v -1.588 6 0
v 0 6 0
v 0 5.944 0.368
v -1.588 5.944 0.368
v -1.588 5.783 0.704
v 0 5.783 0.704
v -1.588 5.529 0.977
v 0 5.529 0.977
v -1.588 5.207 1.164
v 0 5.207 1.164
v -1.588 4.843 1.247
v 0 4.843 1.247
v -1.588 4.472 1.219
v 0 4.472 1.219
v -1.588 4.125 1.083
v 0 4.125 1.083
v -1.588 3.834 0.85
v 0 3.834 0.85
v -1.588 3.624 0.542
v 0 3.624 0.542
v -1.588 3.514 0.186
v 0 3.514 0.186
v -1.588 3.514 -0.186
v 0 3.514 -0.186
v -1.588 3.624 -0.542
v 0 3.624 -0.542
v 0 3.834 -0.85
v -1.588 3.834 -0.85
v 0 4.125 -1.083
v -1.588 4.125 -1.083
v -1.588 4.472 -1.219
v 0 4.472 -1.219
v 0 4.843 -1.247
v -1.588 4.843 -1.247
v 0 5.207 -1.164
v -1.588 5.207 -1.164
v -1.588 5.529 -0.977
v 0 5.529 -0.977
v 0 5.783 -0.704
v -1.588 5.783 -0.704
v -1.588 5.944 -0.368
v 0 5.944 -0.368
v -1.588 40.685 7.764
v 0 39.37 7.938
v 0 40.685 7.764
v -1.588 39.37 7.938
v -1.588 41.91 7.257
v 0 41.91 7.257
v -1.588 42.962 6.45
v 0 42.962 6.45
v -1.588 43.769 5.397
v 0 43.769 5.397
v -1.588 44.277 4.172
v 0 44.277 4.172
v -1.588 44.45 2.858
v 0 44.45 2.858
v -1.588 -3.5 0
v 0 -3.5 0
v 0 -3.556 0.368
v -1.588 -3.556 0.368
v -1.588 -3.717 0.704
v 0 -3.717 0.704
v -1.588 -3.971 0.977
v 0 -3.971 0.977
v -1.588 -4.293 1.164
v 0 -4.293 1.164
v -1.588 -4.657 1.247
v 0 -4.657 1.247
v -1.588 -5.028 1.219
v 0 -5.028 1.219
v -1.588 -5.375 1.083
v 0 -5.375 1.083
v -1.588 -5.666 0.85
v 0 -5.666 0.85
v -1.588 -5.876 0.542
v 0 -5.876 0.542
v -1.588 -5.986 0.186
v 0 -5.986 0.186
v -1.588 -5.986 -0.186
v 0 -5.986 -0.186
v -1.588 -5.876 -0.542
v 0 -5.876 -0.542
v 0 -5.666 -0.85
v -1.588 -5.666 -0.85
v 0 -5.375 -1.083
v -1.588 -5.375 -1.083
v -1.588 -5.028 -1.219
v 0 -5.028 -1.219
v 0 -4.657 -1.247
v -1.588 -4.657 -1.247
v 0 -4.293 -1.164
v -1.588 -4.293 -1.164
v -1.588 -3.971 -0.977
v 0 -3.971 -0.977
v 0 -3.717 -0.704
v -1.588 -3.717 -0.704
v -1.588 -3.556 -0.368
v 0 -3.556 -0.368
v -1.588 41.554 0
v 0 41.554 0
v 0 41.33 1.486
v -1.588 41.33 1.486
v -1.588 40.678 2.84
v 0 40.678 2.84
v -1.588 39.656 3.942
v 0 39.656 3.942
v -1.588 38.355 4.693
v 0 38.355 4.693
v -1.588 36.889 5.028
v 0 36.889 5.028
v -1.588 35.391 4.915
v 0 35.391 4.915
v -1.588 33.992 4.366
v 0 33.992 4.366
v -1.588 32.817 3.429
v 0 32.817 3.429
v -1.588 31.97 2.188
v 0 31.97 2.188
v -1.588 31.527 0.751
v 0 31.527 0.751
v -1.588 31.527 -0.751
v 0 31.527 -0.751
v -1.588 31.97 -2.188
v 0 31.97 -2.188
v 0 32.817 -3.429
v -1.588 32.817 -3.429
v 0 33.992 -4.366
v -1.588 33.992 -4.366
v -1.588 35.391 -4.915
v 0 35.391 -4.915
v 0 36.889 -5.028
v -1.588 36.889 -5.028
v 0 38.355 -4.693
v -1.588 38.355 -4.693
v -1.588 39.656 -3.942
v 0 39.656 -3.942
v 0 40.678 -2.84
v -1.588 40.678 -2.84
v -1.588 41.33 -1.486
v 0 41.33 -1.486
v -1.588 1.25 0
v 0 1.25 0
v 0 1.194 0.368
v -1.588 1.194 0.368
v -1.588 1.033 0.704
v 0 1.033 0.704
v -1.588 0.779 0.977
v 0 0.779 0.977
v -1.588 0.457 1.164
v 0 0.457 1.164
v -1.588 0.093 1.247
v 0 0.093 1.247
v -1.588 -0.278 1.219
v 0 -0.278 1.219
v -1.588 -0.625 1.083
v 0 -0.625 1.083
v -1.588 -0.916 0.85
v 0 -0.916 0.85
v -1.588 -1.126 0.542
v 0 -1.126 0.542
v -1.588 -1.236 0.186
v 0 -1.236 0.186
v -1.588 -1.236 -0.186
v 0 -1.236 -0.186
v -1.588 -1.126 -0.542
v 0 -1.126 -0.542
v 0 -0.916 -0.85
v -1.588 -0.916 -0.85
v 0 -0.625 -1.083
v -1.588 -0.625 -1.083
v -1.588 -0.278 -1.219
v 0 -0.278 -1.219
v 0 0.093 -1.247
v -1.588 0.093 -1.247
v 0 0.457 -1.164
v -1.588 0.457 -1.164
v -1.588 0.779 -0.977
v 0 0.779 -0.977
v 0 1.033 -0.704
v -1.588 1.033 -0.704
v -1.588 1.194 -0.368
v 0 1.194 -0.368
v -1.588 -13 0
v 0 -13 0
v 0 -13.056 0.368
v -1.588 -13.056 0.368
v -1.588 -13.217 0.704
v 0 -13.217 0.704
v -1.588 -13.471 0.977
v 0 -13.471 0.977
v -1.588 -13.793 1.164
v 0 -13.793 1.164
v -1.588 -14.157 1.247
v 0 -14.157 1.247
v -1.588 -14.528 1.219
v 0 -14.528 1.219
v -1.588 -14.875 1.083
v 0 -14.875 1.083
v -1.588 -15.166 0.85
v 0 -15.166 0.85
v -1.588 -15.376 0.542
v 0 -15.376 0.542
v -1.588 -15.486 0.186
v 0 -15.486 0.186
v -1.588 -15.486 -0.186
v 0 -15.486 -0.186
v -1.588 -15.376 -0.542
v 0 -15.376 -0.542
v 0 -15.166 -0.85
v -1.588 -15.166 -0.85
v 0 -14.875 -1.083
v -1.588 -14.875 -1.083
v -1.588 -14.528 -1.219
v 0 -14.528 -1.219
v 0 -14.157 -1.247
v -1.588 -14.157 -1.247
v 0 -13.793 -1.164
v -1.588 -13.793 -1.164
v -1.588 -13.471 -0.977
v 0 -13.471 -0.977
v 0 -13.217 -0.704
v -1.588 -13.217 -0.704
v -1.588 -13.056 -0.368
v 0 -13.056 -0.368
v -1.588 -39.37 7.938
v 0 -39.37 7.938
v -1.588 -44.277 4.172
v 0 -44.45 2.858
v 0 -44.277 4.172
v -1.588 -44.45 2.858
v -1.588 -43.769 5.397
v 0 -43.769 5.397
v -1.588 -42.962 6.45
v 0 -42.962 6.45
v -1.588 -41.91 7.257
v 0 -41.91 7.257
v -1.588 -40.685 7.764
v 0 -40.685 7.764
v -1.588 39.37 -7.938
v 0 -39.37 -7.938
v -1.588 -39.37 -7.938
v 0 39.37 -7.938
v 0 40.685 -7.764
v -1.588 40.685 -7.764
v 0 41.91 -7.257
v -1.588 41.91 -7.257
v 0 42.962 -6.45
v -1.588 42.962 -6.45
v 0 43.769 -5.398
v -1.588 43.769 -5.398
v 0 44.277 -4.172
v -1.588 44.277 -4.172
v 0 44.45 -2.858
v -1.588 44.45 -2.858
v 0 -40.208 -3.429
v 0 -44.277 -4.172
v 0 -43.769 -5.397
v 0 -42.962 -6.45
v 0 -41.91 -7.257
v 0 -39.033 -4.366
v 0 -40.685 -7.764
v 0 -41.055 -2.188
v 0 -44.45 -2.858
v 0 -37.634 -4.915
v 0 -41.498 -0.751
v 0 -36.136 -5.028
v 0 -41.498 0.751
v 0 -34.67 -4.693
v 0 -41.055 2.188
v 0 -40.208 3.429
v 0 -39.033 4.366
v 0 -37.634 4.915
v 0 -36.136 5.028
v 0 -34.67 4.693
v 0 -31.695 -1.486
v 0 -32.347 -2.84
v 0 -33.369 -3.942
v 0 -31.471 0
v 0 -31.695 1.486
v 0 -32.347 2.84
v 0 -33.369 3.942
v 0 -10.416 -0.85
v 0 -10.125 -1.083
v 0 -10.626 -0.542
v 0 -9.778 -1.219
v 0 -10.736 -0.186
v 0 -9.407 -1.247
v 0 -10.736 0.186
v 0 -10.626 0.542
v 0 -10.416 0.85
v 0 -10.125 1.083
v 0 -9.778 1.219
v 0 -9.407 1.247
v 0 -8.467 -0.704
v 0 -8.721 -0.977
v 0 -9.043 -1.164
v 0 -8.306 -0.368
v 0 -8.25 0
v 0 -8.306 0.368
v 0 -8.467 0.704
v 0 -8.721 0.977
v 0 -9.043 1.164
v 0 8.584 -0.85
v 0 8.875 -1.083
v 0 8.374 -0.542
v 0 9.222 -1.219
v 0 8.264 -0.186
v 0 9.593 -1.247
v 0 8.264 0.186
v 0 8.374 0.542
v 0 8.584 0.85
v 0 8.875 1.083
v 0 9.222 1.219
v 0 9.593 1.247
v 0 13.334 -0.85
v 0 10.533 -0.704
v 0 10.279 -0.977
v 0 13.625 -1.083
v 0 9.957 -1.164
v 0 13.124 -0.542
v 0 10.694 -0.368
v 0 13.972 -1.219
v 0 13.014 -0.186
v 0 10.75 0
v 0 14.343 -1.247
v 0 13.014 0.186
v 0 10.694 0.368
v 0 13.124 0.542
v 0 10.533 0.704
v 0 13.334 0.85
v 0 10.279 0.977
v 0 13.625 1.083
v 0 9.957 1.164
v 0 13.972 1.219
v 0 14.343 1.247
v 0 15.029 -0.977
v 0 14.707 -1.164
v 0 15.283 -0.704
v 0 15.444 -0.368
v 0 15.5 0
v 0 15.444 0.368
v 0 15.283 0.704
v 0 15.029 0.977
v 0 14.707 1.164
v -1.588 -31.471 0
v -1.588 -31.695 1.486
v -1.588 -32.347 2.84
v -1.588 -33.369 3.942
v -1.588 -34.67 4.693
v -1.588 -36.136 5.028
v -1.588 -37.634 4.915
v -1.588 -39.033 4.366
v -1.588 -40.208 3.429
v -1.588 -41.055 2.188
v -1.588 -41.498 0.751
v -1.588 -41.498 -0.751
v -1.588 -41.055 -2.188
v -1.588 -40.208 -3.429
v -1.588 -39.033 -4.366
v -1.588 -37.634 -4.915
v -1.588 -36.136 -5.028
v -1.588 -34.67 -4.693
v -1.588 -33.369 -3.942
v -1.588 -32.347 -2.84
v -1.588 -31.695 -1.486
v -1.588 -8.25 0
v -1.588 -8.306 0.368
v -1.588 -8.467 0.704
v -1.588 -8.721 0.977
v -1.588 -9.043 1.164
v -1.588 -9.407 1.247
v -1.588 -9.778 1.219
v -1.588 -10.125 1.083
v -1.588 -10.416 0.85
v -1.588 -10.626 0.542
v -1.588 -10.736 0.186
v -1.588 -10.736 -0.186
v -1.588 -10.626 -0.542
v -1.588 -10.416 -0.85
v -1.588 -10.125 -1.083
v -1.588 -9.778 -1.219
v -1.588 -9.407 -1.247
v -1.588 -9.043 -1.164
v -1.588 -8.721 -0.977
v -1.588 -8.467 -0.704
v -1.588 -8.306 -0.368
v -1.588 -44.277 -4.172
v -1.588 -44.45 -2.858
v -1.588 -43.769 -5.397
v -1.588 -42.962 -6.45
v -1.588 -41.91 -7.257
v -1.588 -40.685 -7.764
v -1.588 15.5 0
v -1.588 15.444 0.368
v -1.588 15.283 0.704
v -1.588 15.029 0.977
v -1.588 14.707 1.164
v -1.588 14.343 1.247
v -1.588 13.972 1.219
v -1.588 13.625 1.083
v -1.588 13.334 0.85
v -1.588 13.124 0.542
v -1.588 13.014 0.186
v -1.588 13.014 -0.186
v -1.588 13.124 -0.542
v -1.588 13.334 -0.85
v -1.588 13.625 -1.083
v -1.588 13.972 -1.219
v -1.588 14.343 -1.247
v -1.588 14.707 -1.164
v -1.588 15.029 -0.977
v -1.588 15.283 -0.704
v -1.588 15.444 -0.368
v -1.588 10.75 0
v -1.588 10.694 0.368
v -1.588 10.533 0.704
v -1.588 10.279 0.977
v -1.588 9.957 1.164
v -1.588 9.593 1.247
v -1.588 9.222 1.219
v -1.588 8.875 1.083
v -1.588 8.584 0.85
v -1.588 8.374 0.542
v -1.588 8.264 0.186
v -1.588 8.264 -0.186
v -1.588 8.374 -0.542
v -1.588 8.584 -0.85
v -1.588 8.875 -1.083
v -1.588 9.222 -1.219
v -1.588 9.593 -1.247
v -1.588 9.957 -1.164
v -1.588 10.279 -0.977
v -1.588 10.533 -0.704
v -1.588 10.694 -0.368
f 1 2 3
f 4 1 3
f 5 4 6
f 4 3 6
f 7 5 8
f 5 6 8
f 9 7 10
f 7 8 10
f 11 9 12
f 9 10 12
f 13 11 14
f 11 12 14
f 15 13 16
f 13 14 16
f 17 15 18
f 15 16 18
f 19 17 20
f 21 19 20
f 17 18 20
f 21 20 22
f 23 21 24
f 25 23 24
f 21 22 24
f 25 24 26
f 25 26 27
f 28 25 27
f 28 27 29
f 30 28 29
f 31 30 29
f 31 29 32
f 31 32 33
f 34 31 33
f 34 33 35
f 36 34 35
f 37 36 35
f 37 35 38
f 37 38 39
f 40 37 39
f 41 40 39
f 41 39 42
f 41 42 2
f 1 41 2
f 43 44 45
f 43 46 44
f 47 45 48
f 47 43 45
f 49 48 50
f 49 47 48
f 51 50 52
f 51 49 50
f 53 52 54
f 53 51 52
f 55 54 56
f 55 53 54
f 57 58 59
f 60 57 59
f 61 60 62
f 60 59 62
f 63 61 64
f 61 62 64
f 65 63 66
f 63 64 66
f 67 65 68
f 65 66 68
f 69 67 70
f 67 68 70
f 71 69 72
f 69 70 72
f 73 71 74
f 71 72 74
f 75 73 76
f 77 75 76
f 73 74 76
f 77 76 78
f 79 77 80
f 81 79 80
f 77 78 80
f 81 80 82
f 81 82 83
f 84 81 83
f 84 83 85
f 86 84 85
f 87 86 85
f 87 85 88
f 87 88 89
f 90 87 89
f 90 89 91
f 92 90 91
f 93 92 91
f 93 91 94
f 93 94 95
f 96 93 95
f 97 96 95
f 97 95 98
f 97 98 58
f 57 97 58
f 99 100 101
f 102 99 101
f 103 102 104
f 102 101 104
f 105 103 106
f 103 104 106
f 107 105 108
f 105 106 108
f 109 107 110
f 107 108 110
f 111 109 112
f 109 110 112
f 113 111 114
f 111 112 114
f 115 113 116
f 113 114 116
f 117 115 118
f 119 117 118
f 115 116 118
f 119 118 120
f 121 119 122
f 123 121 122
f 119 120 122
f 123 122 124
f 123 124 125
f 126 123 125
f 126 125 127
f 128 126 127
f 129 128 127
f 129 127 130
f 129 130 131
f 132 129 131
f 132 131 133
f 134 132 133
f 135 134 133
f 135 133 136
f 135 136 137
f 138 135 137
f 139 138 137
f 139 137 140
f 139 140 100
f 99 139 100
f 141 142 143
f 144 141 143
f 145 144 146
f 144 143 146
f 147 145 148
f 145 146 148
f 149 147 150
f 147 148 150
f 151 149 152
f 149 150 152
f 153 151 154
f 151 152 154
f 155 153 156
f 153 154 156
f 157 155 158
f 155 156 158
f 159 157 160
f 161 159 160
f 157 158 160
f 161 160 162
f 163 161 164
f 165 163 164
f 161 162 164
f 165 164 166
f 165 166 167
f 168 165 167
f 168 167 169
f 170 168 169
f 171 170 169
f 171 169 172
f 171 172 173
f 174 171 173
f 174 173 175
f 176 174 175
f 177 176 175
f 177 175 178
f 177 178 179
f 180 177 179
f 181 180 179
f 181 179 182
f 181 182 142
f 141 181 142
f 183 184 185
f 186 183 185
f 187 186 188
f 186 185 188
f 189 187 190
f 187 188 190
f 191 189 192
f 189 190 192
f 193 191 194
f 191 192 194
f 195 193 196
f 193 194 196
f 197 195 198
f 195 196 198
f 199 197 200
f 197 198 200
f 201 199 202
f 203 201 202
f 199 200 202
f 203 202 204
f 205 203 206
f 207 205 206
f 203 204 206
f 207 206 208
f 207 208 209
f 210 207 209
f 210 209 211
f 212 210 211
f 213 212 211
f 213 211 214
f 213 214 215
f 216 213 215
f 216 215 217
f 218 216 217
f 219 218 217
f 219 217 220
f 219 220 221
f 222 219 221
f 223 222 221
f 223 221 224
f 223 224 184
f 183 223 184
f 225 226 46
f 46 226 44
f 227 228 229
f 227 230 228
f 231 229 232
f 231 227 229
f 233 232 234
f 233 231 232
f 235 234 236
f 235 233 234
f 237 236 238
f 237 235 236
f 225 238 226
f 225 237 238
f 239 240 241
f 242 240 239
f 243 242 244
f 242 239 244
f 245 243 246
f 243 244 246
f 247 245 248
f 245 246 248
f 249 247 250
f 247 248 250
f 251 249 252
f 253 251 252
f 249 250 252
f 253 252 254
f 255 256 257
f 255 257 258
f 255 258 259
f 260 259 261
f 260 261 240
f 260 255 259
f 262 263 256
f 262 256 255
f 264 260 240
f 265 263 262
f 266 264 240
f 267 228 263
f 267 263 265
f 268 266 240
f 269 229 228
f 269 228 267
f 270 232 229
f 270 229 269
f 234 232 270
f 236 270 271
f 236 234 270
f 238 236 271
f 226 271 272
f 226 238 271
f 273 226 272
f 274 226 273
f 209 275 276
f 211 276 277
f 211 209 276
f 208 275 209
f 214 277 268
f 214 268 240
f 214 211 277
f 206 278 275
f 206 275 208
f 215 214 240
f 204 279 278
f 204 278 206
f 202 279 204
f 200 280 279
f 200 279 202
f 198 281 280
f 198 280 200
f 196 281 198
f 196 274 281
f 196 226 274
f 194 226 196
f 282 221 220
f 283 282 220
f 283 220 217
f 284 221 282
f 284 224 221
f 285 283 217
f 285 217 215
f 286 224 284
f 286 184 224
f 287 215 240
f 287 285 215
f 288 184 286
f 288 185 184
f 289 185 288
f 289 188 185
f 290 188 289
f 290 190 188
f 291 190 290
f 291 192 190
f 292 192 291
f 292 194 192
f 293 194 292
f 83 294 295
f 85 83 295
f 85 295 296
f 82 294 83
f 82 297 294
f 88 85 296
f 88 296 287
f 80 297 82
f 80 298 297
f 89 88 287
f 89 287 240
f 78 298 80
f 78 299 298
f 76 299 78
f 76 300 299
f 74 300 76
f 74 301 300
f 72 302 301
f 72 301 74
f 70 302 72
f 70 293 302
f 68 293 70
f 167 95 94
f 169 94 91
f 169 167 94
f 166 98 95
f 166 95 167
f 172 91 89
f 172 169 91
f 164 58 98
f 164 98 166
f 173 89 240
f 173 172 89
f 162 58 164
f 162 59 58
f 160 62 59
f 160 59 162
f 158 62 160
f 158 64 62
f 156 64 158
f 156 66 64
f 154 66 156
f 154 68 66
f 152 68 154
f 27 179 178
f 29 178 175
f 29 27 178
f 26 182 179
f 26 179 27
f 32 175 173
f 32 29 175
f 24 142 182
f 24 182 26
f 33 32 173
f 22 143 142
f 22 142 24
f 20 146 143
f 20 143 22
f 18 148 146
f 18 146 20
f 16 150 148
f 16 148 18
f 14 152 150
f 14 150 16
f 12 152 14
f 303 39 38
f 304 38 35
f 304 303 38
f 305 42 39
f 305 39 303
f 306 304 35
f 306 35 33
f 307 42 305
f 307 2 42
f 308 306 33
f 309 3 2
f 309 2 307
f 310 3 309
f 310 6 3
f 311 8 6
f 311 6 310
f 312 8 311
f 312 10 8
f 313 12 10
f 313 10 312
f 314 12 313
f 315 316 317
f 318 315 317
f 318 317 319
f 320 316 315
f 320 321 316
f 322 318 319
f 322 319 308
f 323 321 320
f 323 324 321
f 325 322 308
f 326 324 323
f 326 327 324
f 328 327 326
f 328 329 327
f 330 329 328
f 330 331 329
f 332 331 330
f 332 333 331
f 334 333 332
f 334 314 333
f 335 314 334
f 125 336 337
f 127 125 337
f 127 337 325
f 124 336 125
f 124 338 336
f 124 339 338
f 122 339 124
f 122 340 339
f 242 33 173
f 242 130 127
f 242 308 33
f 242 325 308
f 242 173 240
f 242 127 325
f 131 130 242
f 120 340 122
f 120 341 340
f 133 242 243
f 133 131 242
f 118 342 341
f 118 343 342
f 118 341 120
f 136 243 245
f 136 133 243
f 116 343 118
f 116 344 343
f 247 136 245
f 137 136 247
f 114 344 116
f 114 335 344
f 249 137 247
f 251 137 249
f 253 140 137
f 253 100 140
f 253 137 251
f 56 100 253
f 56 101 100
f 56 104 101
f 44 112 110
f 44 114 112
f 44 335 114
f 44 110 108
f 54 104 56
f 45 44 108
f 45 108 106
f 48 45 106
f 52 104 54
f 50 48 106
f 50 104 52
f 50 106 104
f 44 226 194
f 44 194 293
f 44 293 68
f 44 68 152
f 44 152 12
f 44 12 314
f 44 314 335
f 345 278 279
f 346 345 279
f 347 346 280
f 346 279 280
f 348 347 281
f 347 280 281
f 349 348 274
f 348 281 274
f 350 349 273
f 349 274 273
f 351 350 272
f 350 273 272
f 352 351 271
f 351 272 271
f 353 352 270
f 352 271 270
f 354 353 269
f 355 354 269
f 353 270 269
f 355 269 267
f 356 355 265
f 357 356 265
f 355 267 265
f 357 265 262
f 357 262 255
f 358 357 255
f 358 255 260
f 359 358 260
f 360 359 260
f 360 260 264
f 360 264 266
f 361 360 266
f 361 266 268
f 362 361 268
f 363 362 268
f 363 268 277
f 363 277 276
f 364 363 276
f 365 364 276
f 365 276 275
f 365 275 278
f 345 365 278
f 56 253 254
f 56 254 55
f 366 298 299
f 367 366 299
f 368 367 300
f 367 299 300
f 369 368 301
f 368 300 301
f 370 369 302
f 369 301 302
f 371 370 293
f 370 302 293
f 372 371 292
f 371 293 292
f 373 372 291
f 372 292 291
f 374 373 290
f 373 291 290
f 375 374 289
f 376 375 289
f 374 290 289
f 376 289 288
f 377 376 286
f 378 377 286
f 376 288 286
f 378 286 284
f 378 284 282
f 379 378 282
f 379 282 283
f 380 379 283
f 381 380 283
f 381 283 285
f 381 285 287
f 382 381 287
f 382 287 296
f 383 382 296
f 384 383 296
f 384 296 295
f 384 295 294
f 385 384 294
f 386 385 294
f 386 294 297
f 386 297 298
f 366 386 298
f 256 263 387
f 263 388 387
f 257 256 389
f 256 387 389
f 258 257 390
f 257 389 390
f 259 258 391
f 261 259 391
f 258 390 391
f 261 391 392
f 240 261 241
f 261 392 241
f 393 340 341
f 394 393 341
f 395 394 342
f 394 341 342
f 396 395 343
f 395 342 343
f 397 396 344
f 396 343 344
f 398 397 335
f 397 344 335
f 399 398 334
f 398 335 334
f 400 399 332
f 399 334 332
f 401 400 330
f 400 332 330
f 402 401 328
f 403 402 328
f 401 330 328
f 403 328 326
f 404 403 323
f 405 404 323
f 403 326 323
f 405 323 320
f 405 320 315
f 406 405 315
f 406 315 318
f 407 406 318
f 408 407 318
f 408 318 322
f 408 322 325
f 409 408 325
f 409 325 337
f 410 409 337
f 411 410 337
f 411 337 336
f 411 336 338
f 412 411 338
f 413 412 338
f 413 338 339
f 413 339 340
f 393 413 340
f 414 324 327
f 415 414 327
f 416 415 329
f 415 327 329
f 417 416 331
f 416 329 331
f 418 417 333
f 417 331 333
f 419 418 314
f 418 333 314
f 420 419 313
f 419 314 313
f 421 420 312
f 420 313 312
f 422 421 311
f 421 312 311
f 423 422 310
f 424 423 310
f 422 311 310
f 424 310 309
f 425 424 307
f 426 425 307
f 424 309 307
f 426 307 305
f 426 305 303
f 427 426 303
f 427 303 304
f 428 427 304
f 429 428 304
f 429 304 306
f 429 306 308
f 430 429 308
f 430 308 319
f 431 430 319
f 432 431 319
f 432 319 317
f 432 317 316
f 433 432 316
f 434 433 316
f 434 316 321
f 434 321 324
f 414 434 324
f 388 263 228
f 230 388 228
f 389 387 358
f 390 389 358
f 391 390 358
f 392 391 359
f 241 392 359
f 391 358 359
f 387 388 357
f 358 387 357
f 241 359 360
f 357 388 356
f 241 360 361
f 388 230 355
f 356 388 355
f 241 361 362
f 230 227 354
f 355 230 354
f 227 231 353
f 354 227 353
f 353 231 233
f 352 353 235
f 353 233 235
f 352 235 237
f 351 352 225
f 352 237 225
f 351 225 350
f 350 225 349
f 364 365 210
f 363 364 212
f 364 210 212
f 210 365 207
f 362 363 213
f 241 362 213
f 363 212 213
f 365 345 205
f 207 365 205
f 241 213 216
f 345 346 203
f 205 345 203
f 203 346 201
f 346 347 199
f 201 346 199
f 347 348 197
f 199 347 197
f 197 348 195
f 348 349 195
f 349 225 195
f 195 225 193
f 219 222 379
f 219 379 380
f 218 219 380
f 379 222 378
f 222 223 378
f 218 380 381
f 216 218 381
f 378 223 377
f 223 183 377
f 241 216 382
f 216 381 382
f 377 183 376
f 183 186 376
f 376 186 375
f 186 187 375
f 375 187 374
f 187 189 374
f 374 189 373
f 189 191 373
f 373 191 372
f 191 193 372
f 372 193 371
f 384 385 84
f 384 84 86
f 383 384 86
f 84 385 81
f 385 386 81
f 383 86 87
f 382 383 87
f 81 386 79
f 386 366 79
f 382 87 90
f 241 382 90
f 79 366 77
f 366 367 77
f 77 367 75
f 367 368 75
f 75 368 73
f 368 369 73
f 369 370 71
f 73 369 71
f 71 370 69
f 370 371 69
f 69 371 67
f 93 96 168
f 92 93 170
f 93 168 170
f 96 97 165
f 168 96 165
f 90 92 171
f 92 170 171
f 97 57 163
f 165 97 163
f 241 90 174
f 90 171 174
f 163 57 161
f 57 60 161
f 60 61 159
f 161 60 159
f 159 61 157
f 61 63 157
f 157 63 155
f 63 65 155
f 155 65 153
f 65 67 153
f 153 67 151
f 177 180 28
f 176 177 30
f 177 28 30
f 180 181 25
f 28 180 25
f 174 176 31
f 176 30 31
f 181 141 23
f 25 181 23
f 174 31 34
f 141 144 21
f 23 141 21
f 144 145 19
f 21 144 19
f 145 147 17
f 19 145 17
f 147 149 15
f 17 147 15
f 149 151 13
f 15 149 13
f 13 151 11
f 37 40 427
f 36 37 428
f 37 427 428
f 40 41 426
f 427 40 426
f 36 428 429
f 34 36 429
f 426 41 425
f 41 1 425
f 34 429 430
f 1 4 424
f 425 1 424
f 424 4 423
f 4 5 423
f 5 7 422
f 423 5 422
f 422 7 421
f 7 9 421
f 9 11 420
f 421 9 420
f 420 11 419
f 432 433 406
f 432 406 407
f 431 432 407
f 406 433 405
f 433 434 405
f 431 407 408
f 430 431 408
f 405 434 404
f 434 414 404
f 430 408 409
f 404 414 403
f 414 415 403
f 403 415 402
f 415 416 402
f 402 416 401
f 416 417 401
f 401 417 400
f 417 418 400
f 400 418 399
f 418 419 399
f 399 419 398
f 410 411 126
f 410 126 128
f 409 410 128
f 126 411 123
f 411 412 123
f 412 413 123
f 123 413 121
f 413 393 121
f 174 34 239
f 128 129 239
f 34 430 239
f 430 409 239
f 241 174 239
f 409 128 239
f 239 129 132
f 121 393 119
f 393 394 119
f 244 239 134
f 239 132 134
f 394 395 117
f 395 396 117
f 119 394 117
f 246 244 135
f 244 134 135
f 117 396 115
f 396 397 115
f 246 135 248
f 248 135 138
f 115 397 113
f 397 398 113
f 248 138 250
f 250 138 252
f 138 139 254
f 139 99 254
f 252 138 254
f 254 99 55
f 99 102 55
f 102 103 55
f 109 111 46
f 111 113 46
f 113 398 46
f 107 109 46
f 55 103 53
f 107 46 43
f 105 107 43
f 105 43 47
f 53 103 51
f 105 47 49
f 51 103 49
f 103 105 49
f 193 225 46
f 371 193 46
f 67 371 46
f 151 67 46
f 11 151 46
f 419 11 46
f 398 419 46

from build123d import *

# Parameters (mm, degrees)
SKETCH1_W               = 88.9
SKETCH1_H               = 15.875
BASE_FLANGE1_DEPTH      = 1.5875
F_2_5MM_DOWEL_HOLE1_D   = 2.5
LPATTERN1_COUNT         = 4
LPATTERN1_PITCH         = 4.750000025
LPATTERN1_COL_COUNT     = 4
LPATTERN1_COL_PITCH     = 4.750000025
FILLET1_R               = 5.08
F_3_8_CLEARANCE_HOLE1_D = 10.0838


# Sheet-metal steps are written as plain solids
with BuildPart() as part:
    # Sketch1 → Base-Flange1 (new body)
    with BuildSketch(Plane.YZ):
        Rectangle(SKETCH1_W, SKETCH1_H)
    extrude(amount=-BASE_FLANGE1_DEPTH)

    # Ø2.5mm Dowel Hole1 (through all)
    with Locations(Plane(origin=(-1.5875, 0, 0), x_dir=(0, -1, 0), z_dir=(-1, 0, 0))):
        with Locations((0, 0)):
            f_2_5mm_dowel_hole1 = Hole(F_2_5MM_DOWEL_HOLE1_D / 2)

    # LPattern1: Ø2.5mm Dowel Hole1 ×4
    with Locations(*[(0, -i * LPATTERN1_PITCH, 0) for i in range(1, LPATTERN1_COUNT)]):
        add(f_2_5mm_dowel_hole1, mode=Mode.SUBTRACT)

    # LPattern1 col: Ø2.5mm Dowel Hole1 ×4
    with Locations(*[(0, i * LPATTERN1_COL_PITCH, 0) for i in range(1, LPATTERN1_COL_COUNT)]):
        add(f_2_5mm_dowel_hole1, mode=Mode.SUBTRACT)

    # Fillet1
    fillet1_edges = [part.edges().sort_by_distance(p)[0] for p in [
        (-0.79375, -44.45, 7.9375),
        (-0.79375, 44.45, 7.9375),
        (-0.79375, 44.45, -7.9375),
        (-0.79375, -44.45, -7.9375),
    ]]
    fillet(fillet1_edges, radius=FILLET1_R)

    # 3/8 Clearance Hole1 (through all)
    with Locations(Plane(origin=(-1.5875, 0, 0), x_dir=(0, -1, 0), z_dir=(-1, 0, 0))):
        with Locations((-36.5125, 0), (36.5125, 0)):
            Hole(F_3_8_CLEARANCE_HOLE1_D / 2)


solid = part.part
